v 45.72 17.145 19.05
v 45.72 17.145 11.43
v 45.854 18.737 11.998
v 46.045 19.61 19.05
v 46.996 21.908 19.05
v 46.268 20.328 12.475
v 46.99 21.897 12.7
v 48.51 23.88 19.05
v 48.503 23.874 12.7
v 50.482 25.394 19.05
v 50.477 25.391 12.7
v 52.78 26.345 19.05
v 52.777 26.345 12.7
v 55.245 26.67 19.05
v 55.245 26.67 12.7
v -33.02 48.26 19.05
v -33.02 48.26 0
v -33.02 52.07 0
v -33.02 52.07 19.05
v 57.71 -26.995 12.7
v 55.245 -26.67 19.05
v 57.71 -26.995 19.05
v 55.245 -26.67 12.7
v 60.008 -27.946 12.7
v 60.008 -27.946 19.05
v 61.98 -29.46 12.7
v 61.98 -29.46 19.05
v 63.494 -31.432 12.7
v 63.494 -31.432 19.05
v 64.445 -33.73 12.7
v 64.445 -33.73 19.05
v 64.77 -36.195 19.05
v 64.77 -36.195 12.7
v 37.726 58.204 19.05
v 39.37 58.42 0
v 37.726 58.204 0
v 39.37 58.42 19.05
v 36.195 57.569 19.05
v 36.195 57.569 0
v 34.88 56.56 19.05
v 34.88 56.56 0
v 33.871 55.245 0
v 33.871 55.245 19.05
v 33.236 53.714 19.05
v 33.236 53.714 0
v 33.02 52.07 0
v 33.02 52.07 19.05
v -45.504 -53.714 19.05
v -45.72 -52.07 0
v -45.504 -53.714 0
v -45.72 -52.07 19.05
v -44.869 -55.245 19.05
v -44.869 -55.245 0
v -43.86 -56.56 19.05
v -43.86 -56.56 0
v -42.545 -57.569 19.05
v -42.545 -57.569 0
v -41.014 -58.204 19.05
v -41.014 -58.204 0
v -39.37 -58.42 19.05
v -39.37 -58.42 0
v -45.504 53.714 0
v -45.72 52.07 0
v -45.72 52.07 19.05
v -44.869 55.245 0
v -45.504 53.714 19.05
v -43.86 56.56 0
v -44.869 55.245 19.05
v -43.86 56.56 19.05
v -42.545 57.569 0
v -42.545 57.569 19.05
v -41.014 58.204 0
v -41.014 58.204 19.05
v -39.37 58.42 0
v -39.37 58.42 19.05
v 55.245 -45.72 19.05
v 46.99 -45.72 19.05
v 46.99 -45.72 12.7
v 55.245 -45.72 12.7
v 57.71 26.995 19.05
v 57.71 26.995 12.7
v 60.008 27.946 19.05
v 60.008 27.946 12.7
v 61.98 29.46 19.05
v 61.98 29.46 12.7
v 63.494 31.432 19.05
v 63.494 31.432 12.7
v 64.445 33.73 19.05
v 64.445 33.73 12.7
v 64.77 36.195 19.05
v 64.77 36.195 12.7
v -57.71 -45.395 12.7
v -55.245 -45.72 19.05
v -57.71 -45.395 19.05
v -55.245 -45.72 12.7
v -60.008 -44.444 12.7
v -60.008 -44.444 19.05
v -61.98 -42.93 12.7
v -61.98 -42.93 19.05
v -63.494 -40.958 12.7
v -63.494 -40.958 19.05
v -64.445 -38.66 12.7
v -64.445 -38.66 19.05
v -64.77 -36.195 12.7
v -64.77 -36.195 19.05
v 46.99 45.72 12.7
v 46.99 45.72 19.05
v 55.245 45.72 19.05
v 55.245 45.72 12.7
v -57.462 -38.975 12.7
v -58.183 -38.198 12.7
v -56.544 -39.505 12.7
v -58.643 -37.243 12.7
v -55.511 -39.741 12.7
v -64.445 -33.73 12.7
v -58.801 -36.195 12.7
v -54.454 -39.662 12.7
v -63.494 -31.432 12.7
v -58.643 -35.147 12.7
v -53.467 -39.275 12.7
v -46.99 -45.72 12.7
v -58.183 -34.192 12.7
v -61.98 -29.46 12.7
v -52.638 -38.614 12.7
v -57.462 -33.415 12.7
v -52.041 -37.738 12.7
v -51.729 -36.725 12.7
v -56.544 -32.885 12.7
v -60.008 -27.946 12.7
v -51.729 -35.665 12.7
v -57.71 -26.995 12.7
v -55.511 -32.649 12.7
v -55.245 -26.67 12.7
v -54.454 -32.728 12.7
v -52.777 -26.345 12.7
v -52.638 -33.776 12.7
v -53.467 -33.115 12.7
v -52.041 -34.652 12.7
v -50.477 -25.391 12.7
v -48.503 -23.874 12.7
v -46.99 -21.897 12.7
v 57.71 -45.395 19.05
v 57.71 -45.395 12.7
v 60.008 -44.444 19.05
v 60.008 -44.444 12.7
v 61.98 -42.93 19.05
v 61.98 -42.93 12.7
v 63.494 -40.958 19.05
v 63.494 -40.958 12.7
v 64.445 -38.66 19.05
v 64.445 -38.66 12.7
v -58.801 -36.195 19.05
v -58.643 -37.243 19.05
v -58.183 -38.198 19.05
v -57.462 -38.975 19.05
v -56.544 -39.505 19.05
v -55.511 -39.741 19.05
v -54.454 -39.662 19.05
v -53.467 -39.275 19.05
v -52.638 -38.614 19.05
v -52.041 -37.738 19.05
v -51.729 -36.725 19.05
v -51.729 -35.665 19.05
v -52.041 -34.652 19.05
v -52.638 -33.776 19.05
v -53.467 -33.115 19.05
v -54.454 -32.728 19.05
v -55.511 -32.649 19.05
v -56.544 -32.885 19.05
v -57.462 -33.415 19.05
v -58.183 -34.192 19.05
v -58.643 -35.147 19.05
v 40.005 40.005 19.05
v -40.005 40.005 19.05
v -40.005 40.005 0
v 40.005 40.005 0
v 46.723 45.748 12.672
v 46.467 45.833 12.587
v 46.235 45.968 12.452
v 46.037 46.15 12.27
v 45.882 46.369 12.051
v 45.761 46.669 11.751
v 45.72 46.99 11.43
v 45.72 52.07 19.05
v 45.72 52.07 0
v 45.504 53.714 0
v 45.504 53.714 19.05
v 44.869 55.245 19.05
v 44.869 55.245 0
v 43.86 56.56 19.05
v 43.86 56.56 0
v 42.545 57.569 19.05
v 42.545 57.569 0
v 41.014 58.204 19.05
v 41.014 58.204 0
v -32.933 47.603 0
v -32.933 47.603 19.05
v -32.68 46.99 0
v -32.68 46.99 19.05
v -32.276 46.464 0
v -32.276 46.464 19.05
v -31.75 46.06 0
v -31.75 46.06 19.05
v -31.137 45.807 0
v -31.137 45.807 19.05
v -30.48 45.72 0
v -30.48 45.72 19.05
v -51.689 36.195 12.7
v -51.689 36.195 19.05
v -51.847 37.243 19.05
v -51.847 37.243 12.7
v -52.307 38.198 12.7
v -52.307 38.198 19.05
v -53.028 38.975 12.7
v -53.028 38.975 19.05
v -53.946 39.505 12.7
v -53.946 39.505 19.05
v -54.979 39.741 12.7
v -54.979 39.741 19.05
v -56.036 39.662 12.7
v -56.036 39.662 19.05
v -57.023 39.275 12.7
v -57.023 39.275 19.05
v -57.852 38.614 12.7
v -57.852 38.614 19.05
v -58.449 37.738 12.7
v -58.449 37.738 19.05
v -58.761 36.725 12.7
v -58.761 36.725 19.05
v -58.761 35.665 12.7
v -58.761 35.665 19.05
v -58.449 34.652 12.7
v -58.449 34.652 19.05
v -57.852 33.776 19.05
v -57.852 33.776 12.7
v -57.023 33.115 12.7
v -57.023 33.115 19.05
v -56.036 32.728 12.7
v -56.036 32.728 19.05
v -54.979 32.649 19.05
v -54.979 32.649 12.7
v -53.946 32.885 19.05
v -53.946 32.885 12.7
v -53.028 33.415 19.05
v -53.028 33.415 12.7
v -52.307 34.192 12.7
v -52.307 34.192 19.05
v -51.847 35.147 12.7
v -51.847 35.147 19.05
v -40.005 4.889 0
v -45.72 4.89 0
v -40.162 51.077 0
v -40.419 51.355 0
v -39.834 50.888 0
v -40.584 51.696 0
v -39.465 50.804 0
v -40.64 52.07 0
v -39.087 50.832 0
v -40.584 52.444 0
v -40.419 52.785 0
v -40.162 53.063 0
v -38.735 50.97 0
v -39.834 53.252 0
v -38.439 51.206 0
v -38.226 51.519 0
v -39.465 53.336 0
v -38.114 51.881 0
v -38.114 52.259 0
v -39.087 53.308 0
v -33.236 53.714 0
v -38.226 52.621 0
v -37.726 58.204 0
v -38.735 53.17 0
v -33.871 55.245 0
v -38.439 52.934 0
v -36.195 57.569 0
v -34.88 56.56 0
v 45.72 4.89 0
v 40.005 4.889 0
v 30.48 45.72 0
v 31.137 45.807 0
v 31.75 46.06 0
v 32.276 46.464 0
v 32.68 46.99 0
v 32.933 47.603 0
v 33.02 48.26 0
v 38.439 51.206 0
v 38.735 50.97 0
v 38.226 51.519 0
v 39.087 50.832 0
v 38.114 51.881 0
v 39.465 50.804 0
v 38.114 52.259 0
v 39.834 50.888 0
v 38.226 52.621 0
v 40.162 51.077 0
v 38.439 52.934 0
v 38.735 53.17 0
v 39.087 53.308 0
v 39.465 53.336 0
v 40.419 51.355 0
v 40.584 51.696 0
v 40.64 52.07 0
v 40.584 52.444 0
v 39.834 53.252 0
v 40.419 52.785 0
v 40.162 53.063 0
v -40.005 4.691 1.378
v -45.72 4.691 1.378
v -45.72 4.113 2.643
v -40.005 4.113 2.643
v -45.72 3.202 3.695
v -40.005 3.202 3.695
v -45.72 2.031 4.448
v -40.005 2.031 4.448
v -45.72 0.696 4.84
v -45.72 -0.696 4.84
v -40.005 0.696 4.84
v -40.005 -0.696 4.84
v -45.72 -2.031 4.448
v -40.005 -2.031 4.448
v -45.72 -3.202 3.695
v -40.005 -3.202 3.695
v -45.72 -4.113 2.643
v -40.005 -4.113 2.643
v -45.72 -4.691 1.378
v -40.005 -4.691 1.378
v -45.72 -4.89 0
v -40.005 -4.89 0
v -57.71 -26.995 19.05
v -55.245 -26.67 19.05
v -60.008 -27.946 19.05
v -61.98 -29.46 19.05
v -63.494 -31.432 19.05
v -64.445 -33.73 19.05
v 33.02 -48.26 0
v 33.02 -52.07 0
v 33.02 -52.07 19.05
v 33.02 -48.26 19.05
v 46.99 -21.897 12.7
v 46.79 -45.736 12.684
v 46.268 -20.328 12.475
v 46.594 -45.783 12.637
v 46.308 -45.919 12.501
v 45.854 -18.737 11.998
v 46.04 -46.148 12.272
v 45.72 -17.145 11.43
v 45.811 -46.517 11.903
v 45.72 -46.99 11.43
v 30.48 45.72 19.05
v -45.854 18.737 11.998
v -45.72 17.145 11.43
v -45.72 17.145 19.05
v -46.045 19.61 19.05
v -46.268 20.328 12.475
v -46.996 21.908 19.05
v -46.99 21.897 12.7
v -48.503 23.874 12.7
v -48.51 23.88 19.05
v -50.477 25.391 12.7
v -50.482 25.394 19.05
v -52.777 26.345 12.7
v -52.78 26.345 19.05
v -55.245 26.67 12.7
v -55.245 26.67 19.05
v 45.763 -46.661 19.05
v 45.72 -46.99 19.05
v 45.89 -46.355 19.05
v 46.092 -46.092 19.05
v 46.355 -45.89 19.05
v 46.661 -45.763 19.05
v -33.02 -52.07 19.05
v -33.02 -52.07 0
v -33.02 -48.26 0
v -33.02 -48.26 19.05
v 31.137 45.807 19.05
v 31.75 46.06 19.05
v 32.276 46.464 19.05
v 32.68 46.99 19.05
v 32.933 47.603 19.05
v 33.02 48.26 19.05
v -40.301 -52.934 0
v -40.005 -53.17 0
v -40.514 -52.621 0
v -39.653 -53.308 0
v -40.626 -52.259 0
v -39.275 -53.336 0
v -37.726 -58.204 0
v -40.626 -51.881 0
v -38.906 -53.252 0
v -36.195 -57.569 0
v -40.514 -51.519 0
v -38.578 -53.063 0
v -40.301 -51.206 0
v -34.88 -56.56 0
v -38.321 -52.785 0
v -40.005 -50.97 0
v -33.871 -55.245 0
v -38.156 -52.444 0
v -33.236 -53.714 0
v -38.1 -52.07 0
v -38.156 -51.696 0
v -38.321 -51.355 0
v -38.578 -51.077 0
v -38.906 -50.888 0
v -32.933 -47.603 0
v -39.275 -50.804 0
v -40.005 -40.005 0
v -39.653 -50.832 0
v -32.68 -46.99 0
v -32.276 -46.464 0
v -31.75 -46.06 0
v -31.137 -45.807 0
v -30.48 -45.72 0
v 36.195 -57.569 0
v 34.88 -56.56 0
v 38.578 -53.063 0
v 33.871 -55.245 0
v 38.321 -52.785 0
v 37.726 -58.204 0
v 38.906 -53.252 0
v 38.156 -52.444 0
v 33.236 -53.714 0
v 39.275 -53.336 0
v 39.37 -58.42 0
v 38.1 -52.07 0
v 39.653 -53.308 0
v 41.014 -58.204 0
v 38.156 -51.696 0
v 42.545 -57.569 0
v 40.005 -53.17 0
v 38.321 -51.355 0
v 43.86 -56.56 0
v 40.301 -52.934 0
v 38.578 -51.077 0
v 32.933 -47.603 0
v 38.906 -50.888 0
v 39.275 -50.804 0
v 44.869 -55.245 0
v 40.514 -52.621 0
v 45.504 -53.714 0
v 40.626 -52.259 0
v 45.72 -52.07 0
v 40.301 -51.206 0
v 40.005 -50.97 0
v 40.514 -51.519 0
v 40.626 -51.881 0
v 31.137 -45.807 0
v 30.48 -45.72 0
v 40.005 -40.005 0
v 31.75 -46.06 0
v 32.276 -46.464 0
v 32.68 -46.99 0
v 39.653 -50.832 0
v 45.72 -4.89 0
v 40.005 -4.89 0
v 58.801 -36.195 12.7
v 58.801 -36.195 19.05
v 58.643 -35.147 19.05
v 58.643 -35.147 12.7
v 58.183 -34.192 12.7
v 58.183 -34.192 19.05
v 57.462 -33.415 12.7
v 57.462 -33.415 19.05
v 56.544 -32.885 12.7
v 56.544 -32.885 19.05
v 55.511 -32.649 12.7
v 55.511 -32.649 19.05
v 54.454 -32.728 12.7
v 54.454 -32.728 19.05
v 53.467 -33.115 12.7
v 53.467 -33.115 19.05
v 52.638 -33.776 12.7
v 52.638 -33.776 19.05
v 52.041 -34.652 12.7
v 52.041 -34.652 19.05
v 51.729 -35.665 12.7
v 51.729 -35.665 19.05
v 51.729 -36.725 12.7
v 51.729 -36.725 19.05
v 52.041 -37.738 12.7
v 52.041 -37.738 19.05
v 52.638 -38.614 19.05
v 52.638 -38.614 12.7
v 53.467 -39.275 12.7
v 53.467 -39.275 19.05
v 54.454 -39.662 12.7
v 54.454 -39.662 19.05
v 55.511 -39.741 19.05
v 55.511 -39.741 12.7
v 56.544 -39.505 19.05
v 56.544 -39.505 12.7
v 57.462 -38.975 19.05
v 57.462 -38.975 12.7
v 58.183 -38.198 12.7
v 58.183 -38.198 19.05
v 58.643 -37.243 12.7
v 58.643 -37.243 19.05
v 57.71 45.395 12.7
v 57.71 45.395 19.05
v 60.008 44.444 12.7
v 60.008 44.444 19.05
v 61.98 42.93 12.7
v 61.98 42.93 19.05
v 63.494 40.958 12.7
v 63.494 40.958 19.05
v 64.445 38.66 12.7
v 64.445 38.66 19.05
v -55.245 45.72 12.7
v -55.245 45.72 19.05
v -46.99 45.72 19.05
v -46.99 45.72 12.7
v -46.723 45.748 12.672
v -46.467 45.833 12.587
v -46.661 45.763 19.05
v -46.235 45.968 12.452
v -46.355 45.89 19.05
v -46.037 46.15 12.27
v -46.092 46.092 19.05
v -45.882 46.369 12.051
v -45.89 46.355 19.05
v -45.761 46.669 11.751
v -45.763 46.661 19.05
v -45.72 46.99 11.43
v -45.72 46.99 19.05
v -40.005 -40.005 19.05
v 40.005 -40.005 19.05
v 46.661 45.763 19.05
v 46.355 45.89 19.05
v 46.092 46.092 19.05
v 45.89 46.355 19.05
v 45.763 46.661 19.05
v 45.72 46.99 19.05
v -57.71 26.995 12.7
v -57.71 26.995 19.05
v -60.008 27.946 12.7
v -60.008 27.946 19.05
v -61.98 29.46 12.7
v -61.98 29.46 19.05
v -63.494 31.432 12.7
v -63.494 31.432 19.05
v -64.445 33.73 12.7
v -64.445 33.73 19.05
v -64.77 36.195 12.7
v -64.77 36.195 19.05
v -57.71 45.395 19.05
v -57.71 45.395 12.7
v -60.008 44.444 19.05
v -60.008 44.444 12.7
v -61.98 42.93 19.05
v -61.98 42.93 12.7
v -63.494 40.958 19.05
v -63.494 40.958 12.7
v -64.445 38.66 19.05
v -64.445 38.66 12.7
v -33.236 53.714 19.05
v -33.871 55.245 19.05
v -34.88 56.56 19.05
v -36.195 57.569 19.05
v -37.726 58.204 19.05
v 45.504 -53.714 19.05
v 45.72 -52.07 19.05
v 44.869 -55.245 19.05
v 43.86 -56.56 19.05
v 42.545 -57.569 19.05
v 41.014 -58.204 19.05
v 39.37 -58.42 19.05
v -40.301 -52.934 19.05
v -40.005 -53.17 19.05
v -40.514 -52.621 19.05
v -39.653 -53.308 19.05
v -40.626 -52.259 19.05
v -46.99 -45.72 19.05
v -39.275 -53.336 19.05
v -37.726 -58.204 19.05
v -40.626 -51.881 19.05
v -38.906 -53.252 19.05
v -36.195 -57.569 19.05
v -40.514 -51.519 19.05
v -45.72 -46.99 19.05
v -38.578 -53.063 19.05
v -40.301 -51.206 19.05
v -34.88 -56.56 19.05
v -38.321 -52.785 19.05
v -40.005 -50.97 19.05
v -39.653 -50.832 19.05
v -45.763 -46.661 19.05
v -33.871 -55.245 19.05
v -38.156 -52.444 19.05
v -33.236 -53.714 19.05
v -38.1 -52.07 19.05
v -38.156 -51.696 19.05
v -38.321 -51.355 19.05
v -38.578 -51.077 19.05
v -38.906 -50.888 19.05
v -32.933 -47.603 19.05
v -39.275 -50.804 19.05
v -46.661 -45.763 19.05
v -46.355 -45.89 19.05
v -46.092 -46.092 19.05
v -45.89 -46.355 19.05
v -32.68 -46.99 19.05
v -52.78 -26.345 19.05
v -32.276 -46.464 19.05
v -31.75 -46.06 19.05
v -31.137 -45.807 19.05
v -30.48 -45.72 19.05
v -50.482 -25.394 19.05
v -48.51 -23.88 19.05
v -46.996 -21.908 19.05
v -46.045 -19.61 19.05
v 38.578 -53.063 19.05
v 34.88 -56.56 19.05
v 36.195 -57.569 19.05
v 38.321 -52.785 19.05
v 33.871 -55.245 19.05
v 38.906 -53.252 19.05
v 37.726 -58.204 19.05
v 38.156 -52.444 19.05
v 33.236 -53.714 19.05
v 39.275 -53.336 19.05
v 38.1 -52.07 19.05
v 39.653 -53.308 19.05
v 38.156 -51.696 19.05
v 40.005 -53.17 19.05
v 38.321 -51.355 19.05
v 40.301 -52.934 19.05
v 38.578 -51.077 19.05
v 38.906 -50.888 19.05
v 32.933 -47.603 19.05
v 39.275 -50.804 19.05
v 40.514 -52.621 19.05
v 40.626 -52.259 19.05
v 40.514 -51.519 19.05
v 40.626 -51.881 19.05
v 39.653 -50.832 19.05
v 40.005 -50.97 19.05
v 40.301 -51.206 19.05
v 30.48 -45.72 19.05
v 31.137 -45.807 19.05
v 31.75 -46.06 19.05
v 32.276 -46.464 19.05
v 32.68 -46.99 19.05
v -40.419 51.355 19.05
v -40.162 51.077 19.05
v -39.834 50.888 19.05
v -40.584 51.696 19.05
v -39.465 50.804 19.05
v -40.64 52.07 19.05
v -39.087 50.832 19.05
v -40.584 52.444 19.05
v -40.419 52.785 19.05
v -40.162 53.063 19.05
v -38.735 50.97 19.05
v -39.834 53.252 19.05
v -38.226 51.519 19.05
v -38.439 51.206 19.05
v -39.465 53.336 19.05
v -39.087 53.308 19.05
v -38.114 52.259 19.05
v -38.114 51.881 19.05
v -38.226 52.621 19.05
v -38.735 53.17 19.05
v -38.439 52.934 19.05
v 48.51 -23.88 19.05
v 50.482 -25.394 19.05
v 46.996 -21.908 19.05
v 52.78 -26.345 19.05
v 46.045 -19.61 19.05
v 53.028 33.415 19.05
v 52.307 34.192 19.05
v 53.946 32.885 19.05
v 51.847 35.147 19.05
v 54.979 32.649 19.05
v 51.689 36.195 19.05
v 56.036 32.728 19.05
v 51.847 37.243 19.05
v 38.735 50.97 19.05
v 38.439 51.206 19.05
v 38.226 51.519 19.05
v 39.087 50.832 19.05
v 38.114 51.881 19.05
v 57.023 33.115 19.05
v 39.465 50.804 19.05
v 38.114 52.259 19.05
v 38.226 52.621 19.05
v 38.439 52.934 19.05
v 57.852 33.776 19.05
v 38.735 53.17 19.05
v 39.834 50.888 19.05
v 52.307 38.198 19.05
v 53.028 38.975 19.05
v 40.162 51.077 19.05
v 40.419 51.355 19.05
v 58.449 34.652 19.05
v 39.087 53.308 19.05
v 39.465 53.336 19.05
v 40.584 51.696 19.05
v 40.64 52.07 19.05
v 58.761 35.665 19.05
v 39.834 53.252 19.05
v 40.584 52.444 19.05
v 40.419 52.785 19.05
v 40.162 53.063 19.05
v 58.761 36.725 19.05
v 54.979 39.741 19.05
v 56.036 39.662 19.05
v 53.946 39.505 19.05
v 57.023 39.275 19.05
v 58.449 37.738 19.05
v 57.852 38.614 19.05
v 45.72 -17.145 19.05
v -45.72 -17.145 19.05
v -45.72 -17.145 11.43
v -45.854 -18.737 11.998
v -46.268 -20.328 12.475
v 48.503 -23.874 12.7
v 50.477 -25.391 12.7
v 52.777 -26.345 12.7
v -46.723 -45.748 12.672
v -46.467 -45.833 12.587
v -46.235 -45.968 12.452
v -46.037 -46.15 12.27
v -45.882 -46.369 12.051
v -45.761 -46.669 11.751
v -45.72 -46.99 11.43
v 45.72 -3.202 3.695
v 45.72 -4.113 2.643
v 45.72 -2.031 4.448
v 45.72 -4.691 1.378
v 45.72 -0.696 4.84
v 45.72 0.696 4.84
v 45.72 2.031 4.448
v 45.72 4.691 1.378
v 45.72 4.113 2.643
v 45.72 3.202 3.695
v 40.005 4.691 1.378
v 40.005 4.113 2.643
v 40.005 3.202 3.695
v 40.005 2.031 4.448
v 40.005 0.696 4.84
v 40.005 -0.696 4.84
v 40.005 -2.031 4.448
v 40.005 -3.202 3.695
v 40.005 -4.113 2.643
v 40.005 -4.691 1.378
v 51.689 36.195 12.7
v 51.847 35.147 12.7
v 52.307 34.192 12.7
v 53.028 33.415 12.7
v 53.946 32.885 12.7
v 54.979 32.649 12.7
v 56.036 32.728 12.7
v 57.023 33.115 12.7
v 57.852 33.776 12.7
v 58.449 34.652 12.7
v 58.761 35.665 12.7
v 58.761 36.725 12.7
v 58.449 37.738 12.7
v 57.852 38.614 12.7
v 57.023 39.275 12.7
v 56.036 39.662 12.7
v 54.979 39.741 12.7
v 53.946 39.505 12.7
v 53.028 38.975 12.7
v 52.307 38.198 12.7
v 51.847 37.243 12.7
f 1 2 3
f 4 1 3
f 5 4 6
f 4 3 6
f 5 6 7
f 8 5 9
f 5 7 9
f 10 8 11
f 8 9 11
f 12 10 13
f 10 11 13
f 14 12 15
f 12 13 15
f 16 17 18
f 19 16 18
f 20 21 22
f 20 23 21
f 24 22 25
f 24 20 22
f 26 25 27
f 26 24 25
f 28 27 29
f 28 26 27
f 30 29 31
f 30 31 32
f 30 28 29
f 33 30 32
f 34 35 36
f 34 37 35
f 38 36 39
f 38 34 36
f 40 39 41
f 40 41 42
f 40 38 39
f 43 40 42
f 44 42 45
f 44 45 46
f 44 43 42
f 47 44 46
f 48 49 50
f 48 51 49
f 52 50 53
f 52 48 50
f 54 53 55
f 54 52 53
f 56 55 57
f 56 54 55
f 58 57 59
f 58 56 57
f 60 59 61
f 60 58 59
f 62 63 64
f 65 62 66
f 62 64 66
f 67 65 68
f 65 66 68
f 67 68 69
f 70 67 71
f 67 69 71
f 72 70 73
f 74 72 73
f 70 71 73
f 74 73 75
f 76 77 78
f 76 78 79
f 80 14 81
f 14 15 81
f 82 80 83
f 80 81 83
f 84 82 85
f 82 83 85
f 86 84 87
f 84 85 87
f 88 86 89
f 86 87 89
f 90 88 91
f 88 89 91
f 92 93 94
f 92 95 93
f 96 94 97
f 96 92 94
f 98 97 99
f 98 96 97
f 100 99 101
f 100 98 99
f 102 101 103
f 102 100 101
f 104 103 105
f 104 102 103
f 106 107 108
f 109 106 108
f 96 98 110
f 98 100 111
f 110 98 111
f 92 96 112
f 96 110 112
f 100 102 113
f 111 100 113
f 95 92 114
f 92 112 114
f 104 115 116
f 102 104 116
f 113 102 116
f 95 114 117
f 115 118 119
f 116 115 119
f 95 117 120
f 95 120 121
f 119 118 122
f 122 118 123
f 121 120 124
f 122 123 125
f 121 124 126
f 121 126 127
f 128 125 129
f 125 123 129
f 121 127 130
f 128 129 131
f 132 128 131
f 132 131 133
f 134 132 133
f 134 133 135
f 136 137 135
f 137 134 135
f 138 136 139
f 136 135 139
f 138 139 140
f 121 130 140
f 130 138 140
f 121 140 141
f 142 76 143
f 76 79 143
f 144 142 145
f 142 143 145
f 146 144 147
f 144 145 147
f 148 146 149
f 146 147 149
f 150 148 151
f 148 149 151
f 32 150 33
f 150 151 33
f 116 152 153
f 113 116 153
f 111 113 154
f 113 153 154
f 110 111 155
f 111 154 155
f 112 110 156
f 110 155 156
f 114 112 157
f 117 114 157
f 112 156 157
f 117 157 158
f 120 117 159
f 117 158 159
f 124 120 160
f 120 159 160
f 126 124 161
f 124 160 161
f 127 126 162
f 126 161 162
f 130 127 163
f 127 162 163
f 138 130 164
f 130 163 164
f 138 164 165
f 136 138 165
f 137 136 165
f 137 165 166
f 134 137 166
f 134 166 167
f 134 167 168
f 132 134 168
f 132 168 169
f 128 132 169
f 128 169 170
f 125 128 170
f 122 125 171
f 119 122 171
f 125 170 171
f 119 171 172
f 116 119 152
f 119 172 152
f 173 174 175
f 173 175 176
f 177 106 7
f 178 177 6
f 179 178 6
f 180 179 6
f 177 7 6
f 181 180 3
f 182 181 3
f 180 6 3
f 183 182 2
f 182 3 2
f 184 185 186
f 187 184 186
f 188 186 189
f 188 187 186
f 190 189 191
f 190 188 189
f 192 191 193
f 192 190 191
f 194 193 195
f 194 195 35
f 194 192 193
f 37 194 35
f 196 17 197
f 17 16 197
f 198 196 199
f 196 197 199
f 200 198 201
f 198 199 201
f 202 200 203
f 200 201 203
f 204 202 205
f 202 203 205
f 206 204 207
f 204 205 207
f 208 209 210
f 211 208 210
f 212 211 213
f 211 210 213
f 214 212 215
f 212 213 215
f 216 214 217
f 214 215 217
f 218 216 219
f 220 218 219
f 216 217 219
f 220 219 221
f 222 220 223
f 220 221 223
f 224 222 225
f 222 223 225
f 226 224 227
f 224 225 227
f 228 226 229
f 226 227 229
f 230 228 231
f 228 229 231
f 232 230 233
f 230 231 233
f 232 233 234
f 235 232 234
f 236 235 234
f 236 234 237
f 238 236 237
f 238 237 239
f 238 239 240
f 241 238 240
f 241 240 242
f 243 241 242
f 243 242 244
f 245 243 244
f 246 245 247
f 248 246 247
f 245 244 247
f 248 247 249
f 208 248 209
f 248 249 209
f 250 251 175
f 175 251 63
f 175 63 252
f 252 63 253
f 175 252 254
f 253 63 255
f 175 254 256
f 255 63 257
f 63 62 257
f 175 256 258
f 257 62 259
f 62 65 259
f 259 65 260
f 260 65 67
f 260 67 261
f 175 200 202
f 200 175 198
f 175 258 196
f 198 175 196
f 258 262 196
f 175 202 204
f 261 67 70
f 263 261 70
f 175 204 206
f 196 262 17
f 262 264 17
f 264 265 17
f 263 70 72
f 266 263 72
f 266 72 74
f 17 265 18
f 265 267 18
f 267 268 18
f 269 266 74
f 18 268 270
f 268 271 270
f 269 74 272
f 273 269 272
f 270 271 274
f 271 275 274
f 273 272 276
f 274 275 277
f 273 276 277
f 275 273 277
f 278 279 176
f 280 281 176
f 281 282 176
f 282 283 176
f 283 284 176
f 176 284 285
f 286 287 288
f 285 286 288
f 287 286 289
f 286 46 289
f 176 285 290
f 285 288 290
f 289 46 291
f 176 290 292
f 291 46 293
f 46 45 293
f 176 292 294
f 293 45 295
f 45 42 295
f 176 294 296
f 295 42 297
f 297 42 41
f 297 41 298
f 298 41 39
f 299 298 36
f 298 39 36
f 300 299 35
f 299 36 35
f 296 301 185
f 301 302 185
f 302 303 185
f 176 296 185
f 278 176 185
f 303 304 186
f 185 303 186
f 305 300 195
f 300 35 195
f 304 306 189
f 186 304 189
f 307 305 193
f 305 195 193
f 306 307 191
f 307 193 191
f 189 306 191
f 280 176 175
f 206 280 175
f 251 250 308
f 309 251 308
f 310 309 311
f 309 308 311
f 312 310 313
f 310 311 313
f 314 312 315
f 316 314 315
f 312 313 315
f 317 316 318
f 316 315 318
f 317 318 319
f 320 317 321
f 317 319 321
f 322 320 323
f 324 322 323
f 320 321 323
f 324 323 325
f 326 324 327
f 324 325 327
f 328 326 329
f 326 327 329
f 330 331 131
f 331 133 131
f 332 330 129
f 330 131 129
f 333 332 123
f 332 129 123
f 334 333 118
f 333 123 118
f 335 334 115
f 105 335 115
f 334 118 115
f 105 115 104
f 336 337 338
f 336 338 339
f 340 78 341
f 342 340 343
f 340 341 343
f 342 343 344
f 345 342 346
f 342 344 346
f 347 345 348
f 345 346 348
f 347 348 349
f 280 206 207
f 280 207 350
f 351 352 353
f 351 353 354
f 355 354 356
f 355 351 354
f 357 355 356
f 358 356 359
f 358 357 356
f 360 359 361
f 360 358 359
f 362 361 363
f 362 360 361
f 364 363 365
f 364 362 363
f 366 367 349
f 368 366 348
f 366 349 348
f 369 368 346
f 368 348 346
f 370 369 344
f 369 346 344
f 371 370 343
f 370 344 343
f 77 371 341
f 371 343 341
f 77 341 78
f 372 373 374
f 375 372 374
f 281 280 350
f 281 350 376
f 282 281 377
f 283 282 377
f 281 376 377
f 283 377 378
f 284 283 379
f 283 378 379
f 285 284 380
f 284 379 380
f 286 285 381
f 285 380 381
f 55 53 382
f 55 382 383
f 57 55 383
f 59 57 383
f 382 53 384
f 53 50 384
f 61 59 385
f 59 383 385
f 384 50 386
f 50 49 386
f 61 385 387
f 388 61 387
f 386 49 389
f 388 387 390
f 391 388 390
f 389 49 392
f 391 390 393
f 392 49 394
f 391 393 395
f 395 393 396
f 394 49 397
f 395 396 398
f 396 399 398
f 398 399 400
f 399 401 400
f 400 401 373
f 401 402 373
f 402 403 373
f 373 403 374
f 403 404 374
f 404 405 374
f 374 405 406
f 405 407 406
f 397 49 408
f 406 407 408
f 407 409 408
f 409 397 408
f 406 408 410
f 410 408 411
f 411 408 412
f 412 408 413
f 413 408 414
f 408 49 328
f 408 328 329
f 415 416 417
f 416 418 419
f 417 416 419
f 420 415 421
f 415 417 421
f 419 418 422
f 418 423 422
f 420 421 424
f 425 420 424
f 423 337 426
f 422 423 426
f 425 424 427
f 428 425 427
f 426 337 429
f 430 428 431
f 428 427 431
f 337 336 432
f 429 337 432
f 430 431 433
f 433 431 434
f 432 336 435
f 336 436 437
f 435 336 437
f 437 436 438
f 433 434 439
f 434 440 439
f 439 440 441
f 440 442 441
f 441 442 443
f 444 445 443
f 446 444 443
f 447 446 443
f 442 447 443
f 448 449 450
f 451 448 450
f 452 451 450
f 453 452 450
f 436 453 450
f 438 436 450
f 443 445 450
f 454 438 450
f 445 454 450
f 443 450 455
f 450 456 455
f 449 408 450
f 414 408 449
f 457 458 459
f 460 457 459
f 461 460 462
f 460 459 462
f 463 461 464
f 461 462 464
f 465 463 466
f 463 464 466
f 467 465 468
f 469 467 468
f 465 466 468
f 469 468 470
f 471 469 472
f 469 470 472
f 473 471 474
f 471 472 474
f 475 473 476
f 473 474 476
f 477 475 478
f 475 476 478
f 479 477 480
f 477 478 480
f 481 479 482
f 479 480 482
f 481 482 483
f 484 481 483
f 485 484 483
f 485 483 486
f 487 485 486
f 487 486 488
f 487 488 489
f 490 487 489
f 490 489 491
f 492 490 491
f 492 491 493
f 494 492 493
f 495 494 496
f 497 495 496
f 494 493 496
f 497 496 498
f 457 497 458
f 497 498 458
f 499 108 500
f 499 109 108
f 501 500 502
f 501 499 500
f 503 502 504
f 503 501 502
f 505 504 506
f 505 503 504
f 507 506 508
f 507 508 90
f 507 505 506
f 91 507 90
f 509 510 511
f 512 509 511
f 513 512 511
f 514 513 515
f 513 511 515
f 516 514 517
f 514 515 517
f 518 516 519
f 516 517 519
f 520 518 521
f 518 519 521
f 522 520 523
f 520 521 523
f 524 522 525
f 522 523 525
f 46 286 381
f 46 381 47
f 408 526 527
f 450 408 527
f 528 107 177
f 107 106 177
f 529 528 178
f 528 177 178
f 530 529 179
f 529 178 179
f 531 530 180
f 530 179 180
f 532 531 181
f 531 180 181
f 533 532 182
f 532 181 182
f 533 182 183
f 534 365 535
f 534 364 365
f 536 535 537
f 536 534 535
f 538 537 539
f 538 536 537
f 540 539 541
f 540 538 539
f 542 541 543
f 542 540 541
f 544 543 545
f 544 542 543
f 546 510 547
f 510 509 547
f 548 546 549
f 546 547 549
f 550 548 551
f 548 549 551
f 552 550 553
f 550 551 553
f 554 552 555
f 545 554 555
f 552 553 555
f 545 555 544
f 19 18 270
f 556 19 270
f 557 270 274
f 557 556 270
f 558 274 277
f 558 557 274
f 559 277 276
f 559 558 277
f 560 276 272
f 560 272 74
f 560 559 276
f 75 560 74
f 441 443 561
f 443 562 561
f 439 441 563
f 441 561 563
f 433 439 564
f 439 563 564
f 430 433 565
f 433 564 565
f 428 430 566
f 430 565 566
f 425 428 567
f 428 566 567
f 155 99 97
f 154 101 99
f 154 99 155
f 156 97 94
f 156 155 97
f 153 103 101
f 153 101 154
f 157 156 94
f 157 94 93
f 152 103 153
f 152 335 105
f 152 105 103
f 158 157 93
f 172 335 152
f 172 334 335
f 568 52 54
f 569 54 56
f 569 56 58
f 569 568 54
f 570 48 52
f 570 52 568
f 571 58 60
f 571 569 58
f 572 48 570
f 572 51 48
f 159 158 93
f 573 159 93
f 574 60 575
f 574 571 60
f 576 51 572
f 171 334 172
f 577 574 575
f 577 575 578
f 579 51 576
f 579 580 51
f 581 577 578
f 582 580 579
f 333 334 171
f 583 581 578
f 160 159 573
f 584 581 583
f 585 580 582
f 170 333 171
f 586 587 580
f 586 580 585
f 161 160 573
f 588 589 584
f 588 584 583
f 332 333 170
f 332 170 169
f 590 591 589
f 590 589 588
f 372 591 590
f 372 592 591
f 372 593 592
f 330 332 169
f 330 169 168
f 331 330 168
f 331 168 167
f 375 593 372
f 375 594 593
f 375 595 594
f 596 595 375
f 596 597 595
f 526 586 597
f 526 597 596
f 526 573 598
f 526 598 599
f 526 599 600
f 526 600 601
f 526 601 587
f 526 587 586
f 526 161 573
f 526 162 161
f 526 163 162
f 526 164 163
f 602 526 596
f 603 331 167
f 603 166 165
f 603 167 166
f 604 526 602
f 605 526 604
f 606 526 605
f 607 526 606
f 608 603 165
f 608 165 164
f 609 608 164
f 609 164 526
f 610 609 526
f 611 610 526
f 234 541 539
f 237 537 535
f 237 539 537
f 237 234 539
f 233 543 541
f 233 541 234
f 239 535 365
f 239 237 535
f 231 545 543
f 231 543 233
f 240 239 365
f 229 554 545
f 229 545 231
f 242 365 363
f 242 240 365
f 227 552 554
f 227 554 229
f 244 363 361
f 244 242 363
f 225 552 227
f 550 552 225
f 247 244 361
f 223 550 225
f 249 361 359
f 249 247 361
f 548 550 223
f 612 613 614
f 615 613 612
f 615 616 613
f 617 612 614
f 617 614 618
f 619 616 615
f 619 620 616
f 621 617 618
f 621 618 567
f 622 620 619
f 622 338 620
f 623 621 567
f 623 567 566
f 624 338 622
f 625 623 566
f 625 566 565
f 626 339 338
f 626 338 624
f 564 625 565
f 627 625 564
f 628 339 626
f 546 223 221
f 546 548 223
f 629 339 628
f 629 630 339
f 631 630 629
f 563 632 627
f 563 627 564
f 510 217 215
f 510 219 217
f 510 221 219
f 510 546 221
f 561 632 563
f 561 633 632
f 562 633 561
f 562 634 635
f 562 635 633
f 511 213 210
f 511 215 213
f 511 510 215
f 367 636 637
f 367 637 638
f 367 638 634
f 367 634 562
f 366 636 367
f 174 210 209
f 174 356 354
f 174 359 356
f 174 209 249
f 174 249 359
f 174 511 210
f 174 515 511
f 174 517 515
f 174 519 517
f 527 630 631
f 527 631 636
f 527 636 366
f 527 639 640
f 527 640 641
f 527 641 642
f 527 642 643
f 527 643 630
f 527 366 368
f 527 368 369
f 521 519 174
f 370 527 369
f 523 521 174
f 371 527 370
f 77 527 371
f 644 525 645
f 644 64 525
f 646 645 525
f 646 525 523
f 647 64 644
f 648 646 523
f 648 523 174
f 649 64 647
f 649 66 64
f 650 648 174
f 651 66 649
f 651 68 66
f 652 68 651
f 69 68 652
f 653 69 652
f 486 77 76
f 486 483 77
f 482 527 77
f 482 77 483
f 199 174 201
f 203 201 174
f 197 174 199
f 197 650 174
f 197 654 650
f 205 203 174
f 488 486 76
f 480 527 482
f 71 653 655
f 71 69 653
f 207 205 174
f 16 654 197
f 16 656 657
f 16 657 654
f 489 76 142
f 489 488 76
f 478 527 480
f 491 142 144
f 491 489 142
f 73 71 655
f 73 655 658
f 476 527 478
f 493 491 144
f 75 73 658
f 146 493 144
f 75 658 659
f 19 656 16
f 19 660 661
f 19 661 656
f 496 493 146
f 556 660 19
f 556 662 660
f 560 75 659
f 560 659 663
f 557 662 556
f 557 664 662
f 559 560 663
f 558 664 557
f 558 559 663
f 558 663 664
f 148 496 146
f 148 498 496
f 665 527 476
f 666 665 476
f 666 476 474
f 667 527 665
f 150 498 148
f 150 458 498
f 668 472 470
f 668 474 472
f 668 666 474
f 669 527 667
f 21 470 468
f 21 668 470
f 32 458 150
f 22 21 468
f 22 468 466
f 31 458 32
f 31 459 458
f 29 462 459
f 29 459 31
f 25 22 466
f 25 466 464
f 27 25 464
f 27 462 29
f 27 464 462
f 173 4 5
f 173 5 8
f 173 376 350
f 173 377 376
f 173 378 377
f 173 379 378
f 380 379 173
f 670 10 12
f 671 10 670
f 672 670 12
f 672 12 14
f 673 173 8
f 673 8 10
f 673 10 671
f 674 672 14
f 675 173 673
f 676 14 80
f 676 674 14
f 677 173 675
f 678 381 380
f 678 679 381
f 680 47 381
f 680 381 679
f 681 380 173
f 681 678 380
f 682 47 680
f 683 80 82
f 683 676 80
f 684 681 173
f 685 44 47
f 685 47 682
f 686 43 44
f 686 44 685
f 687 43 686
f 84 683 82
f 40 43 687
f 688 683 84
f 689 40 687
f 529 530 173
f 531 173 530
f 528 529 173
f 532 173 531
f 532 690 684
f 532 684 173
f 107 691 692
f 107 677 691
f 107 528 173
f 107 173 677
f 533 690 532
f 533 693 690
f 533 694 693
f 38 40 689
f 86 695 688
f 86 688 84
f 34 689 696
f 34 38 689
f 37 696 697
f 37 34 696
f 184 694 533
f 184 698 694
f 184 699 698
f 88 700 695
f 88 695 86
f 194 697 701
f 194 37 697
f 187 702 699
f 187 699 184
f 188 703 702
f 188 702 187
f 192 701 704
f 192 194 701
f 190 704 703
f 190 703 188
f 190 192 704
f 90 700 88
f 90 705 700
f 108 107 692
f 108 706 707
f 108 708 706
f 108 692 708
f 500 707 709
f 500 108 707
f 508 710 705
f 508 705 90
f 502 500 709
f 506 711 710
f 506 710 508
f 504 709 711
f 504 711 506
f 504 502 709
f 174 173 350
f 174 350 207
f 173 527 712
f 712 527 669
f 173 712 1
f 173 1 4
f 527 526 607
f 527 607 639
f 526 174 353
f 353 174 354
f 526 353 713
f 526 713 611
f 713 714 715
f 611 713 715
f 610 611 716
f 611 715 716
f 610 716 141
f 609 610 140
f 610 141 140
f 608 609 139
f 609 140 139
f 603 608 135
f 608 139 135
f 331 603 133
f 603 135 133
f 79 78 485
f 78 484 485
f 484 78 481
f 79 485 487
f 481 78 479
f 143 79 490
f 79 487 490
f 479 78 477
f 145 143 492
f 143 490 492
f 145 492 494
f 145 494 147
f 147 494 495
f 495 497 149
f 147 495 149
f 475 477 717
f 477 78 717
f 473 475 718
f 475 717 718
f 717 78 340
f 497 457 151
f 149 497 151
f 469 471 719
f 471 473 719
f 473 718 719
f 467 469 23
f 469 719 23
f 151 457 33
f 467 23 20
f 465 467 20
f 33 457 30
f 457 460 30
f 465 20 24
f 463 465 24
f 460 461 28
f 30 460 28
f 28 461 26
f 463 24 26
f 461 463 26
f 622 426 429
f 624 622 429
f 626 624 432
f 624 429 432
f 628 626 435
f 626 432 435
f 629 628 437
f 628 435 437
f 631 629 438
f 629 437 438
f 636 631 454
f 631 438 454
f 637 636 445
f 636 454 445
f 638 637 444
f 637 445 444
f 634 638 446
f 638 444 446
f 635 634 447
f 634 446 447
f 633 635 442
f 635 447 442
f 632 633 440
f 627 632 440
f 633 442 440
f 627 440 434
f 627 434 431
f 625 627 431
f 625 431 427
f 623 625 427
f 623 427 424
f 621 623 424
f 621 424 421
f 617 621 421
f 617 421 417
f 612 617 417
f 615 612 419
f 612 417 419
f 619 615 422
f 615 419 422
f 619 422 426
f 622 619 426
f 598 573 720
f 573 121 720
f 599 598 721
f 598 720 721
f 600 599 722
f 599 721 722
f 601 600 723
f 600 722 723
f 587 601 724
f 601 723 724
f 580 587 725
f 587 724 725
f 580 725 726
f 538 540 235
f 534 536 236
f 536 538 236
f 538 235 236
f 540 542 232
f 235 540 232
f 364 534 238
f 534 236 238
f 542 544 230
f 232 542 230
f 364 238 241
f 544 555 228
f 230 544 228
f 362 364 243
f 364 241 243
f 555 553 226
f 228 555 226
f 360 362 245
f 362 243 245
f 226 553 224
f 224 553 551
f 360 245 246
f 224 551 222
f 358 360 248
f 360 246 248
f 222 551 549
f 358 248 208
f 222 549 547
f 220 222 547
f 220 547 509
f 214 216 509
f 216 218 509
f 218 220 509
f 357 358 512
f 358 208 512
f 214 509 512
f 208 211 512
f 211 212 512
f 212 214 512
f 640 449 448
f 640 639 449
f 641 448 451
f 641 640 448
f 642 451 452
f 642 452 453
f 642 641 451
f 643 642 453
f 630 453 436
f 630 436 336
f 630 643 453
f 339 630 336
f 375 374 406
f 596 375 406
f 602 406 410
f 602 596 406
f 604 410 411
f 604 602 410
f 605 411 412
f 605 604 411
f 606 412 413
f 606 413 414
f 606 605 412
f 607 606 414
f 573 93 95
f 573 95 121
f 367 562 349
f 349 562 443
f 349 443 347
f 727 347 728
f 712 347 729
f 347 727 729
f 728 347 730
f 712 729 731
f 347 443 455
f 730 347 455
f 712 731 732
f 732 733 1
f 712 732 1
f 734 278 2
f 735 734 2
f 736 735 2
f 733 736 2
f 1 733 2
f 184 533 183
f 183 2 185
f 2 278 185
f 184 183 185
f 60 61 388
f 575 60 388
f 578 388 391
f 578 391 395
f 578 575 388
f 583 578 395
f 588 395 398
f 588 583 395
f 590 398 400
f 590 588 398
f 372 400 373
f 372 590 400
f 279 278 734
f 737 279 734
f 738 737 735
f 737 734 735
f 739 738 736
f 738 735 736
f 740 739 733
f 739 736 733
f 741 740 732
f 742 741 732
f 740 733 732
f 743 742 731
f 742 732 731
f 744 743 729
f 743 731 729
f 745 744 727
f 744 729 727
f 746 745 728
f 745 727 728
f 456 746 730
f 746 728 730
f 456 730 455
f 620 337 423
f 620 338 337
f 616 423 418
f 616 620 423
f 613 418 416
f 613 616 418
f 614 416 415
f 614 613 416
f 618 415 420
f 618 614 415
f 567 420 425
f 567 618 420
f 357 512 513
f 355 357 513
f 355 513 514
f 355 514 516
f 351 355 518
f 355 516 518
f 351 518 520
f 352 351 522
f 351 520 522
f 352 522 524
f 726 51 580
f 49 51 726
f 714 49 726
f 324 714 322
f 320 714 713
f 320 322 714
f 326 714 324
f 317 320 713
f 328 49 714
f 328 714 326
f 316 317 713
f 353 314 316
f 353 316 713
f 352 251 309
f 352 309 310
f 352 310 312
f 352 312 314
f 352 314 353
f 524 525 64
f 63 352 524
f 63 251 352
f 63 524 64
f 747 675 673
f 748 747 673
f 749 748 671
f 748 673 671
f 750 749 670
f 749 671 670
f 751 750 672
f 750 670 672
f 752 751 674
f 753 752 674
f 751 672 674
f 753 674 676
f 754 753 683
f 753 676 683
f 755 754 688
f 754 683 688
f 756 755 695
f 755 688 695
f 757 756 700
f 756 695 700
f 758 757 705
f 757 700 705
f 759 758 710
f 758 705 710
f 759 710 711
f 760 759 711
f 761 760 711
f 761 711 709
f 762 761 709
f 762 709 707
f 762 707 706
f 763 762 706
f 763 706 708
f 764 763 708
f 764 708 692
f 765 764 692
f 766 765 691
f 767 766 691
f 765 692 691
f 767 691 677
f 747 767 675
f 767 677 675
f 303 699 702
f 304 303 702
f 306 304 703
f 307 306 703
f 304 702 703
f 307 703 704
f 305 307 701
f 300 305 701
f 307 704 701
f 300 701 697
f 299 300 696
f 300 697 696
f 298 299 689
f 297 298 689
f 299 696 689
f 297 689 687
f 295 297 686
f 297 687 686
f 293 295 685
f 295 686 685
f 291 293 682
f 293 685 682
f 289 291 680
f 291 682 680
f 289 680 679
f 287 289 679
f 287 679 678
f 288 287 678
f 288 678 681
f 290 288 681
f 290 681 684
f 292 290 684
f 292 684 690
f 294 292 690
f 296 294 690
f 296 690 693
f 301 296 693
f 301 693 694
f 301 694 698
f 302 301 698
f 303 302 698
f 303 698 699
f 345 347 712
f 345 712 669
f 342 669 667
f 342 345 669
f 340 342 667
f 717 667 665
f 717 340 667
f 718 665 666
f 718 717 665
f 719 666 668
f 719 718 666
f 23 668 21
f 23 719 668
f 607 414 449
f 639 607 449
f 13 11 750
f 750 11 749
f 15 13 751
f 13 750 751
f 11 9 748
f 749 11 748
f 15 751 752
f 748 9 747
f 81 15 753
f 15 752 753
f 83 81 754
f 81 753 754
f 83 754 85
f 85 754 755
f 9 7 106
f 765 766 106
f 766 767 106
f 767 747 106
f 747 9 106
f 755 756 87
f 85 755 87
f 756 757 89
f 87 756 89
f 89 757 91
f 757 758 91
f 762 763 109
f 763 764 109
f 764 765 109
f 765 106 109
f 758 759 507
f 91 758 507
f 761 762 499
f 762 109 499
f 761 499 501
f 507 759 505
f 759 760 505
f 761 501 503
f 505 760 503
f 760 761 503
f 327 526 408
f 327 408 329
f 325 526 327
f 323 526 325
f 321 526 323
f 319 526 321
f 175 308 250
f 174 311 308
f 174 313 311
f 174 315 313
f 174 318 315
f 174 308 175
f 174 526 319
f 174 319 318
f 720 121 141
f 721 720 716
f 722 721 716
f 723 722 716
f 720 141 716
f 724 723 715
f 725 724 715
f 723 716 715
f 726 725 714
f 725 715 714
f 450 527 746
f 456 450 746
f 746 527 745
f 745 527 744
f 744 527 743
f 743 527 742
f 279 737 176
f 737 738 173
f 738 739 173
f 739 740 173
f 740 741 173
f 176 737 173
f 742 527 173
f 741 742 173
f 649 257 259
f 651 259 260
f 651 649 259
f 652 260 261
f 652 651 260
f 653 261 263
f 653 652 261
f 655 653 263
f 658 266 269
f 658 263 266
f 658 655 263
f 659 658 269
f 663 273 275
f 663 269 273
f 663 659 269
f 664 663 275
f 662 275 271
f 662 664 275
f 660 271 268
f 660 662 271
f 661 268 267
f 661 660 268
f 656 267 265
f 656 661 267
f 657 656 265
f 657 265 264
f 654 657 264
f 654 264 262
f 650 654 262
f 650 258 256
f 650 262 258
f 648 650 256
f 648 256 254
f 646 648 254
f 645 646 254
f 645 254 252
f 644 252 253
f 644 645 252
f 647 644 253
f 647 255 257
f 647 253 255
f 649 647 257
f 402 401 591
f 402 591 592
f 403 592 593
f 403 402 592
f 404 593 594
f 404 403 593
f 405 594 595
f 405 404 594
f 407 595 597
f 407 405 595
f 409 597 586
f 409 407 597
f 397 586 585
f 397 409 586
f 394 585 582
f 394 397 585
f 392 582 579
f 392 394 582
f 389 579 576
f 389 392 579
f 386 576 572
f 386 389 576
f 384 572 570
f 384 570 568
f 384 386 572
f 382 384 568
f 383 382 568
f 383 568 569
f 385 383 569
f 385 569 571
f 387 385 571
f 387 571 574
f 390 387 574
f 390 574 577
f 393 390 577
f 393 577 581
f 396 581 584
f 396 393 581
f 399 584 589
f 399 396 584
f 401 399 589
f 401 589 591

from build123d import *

# Parameters (mm, degrees)
SKETCH1_W            = 91.44
SKETCH1_H            = 91.44
BOSS_EXTRUDE1_DEPTH  = 19.05
SKETCH2_W            = 80.01
SKETCH2_H            = 80.01
CUT_EXTRUDE1_DEPTH   = 68.405780909
SKETCH3_R            = 4.8895
CUT_EXTRUDE2_DEPTH   = 104.992761767
SKETCH4_W            = 12.7
SKETCH4_H            = 12.7
BOSS_EXTRUDE2_DEPTH  = 19.05
SKETCH5_R            = 1.27
CUT_EXTRUDE3_DEPTH   = 77.590582319
FILLET1_R            = 6.35
SKETCH6_W            = 12.7
SKETCH6_H            = 12.7
SKETCH6_R            = 1.27
BOSS_EXTRUDE3_DEPTH  = 19.05
FILLET4_R            = 6.35
FILLET1_OF_MIRROR8_R = 6.35
FILLET4_OF_MIRROR8_R = 6.35
FILLET5_R            = 2.54
SKETCH7_W            = 19.05
SKETCH7_H            = 19.05
SKETCH7_R            = 3.556
BOSS_EXTRUDE4_DEPTH  = 6.35
FILLET6_R            = 9.525
FILLET7_R            = 1.27
FILLET8_R            = 1.27


with BuildPart() as part:
    # Sketch1 → Boss-Extrude1 (new body)
    with BuildSketch(Plane.XY):
        Rectangle(SKETCH1_W, SKETCH1_H)
    extrude(amount=BOSS_EXTRUDE1_DEPTH)

    # Sketch2 → Cut-Extrude1 (cut, through all)
    with BuildSketch(Plane.XY.offset(19.05)):
        Rectangle(SKETCH2_W, SKETCH2_H)
    extrude(amount=-CUT_EXTRUDE1_DEPTH, mode=Mode.SUBTRACT)

    # Sketch3 → Cut-Extrude2 (cut, through all)
    with BuildSketch(Plane(origin=(45.72, 0, 0), x_dir=(0, 0, -1), z_dir=(1, 0, 0))):
        Circle(SKETCH3_R)
        with Locations((0, 57.404)):
            Circle(SKETCH3_R)
        with Locations((0, -57.404)):
            Circle(SKETCH3_R)
    extrude(amount=-CUT_EXTRUDE2_DEPTH, mode=Mode.SUBTRACT)

    # Sketch4 → Boss-Extrude2 (add, through all)
    with BuildSketch(Plane(origin=(0, 0, 0), x_dir=(-1, 0, 0), z_dir=(0, 0, -1))):
        with Locations((-39.37, 52.07)):
            Rectangle(SKETCH4_W, SKETCH4_H)
    boss_extrude2 = extrude(amount=-BOSS_EXTRUDE2_DEPTH)

    # Sketch5 → Cut-Extrude3 (cut, through all)
    with BuildSketch(Plane.XY.offset(19.05)):
        with Locations((39.37, 52.07)):
            Circle(SKETCH5_R)
    cut_extrude3 = extrude(amount=-CUT_EXTRUDE3_DEPTH, mode=Mode.SUBTRACT)

    # Fillet1
    fillet1_edges = [part.edges().sort_by_distance(p)[0] for p in [
        (33.02, 58.42, 9.525),
        (45.72, 58.42, 9.525),
    ]]
    fillet(fillet1_edges, radius=FILLET1_R - 0.0001)  # a hair under: the kernel refuses the full size

    # Sketch6 → Boss-Extrude3 (add, through all)
    with BuildSketch(Plane(origin=(0, 0, 0), x_dir=(-1, 0, 0), z_dir=(0, 0, -1))):
        with Locations((-39.37, -52.07)):
            Rectangle(SKETCH6_W, SKETCH6_H)
        with Locations((-39.37, -52.07)):
            Circle(SKETCH6_R, mode=Mode.SUBTRACT)
    boss_extrude3 = extrude(amount=-BOSS_EXTRUDE3_DEPTH)

    # Fillet4
    fillet4_edges = [part.edges().sort_by_distance(p)[0] for p in [
        (45.72, -58.42, 9.525),
        (33.02, -58.42, 9.525),
    ]]
    fillet(fillet4_edges, radius=FILLET4_R - 0.0001)  # a hair under: the kernel refuses the full size

    # Mirror8: Boss-Extrude2, Cut-Extrude3, Boss-Extrude3 across plane
    add(boss_extrude2.mirror(Plane(origin=(0, 0, 0), x_dir=(0, 0, 1), z_dir=(1, 0, 0))))
    add(cut_extrude3.mirror(Plane(origin=(0, 0, 0), x_dir=(0, 0, 1), z_dir=(1, 0, 0))), mode=Mode.SUBTRACT)
    add(boss_extrude3.mirror(Plane(origin=(0, 0, 0), x_dir=(0, 0, 1), z_dir=(1, 0, 0))))

    # Fillet1 of Mirror8
    fillet1_of_mirror8_edges = [part.edges().sort_by_distance(p)[0] for p in [
        (-33.02, 58.42, 9.525),
        (-45.72, 58.42, 9.525),
    ]]
    fillet(fillet1_of_mirror8_edges, radius=FILLET1_OF_MIRROR8_R - 0.0001)  # a hair under: the kernel refuses the full size

    # Fillet4 of Mirror8
    fillet4_of_mirror8_edges = [part.edges().sort_by_distance(p)[0] for p in [
        (-45.72, -58.42, 9.525),
        (-33.02, -58.42, 9.525),
    ]]
    fillet(fillet4_of_mirror8_edges, radius=FILLET4_OF_MIRROR8_R - 0.0001)  # a hair under: the kernel refuses the full size

    # Fillet5
    fillet5_edges = [part.edges().sort_by_distance(p)[0] for p in [
        (-33.02, 45.72, 9.525),
        (-33.02, -45.72, 9.525),
        (33.02, 45.72, 9.525),
        (33.02, -45.72, 9.525),
    ]]
    fillet(fillet5_edges, radius=FILLET5_R)

    # Sketch7 → Boss-Extrude4 (add)
    # profile 1 of 4: a face of its own
    with BuildSketch(Plane.XY.offset(19.05)):
        with Locations((-55.245, 36.195)):
            Rectangle(SKETCH7_W, SKETCH7_H)
        with Locations((-55.245, 36.195)):
            Circle(SKETCH7_R, mode=Mode.SUBTRACT)
    # profile 2 of 4: a face of its own
    with BuildSketch(Plane.XY.offset(19.05)):
        with Locations((-55.245, -36.195)):
            Rectangle(SKETCH7_W, SKETCH7_H)
        with Locations(Location((-55.245, -36.195, 0), (0, 0, 180))):
            Circle(SKETCH7_R, mode=Mode.SUBTRACT)
    # profile 3 of 4: a face of its own
    with BuildSketch(Plane.XY.offset(19.05)):
        with Locations((55.245, 36.195)):
            Rectangle(SKETCH7_W, SKETCH7_H)
        with Locations(Location((55.245, 36.195, 0), (0, 0, 180))):
            Circle(SKETCH7_R, mode=Mode.SUBTRACT)
    # profile 4 of 4: a face of its own
    with BuildSketch(Plane.XY.offset(19.05)):
        with Locations((55.245, -36.195)):
            Rectangle(SKETCH7_W, SKETCH7_H)
        with Locations((55.245, -36.195)):
            Circle(SKETCH7_R, mode=Mode.SUBTRACT)
    extrude(amount=-BOSS_EXTRUDE4_DEPTH)

    # Fillet6
    fillet6_edges = [part.edges().sort_by_distance(p)[0] for p in [
        (64.77, -45.72, 15.875),
        (45.72, -26.67, 15.875),
        (64.77, -26.67, 15.875),
        (45.72, 26.67, 15.875),
        (64.77, 26.67, 15.875),
        (64.77, 45.72, 15.875),
        (-45.72, 26.67, 15.875),
        (-64.77, 45.72, 15.875),
        (-64.77, 26.67, 15.875),
        (-45.72, -26.67, 15.875),
        (-64.77, -45.72, 15.875),
        (-64.77, -26.67, 15.875),
    ]]
    fillet(fillet6_edges, radius=FILLET6_R - 0.0001)  # a hair under: the kernel refuses the full size

    # Fillet7
    fillet7_edges = [part.edges().sort_by_distance(p)[0] for p in [
        (-45.72, 31.43255, 12.7),
        (-45.72, -31.43255, 12.7),
        (45.72, 31.43255, 12.7),
        (45.72, -31.43255, 12.7),
    ]]
    fillet(fillet7_edges, radius=FILLET7_R)

    # Fillet8
    fillet8_edges = [part.edges().sort_by_distance(p)[0] for p in [
        (-45.72, 45.72, 15.24),
        (-45.72, -45.72, 15.24),
        (45.72, -45.72, 15.24),
        (45.72, 45.72, 15.24),
    ]]
    fillet(fillet8_edges, radius=FILLET8_R)


solid = part.part
